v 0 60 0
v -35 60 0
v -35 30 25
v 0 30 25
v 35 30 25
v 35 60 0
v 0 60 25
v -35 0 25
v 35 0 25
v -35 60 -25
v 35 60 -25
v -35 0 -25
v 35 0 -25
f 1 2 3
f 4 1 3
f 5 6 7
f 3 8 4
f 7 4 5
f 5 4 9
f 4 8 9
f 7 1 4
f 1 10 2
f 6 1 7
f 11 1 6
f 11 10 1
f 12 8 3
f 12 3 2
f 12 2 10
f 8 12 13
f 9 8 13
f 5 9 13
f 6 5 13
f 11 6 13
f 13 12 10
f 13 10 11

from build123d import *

# Parameters (mm, degrees)
ESBO_O1_W             = 70
ESBO_O1_H             = 50
EXTRUS_O1_DEPTH       = 60
CORTE_EXTRUS_O2_DEPTH = 35


with BuildPart() as part:
    # Esboço1 → Extrusão1 (new body)
    with BuildSketch(Plane(origin=(0, 0, 0), x_dir=(1, 0, 0), z_dir=(0, 1, 0))):
        Rectangle(ESBO_O1_W, ESBO_O1_H)
    extrude(amount=EXTRUS_O1_DEPTH)

    # Esboço5 → Corte-extrusão2 (cut)
    with BuildSketch(Plane.ZY.offset(35)):
        Polygon((0, 60), (25, 30), (25, 60), align=None)
    extrude(amount=-CORTE_EXTRUS_O2_DEPTH, mode=Mode.SUBTRACT)

    # Corte de superfície4
    split(bisect_by=Plane(origin=(24.299305734, 28.349190023, 34.019028028), x_dir=(-0.876685828, 0.30796926, 0.369563112), z_dir=(-0.481063363, -0.56124059, -0.673488708)), keep=Keep.TOP)


solid = part.part
